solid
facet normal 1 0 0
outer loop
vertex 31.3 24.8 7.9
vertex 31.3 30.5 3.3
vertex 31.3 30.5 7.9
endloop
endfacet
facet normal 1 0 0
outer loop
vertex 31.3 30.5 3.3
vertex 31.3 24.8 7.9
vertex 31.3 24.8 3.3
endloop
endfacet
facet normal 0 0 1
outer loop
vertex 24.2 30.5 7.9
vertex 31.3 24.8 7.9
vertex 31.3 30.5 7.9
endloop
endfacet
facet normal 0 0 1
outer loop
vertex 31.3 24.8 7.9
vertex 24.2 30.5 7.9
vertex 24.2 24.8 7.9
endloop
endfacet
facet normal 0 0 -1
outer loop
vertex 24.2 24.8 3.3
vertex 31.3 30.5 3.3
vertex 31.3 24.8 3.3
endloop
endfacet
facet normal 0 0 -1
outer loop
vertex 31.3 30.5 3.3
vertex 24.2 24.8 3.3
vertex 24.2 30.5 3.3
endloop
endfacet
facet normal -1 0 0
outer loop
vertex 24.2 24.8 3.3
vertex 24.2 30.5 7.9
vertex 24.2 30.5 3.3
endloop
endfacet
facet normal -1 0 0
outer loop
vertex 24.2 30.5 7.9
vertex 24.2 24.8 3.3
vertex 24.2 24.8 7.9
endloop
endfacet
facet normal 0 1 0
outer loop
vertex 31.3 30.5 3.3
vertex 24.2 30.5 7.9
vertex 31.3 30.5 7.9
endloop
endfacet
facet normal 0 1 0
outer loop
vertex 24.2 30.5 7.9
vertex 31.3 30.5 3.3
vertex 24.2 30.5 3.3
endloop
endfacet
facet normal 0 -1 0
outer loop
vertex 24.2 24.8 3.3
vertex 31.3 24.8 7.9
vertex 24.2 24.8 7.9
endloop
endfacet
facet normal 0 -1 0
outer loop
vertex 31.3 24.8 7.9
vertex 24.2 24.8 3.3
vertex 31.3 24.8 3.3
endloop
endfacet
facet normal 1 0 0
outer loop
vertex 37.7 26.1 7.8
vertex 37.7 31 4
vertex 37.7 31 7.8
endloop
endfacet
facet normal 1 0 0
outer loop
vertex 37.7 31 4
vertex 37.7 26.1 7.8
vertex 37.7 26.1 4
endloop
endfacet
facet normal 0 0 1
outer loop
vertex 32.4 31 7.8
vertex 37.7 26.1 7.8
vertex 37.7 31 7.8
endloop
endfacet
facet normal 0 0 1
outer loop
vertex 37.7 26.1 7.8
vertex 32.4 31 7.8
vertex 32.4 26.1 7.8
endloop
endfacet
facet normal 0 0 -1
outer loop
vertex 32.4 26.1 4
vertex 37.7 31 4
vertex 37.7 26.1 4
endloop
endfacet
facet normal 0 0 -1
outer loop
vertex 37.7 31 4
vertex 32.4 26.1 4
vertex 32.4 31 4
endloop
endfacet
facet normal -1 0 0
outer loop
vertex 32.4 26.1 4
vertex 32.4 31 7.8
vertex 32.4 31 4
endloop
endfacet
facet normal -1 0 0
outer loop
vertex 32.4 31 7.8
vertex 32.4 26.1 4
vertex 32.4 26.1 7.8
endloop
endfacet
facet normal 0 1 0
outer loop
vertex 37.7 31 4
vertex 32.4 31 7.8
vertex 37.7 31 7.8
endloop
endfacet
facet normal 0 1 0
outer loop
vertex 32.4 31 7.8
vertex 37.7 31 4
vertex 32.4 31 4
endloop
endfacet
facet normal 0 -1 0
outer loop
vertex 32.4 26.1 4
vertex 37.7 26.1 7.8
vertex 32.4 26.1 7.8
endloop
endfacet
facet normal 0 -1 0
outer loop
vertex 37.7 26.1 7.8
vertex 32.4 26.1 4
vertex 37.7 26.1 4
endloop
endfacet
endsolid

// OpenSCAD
union() {
  translate([24.2, 24.8, 3.3]) cube(size=[7.1,5.7,4.6], center=false);
  translate([32.4, 26.1, 4.0]) cube(size=[5.3,4.9,3.8], center=false);
}
